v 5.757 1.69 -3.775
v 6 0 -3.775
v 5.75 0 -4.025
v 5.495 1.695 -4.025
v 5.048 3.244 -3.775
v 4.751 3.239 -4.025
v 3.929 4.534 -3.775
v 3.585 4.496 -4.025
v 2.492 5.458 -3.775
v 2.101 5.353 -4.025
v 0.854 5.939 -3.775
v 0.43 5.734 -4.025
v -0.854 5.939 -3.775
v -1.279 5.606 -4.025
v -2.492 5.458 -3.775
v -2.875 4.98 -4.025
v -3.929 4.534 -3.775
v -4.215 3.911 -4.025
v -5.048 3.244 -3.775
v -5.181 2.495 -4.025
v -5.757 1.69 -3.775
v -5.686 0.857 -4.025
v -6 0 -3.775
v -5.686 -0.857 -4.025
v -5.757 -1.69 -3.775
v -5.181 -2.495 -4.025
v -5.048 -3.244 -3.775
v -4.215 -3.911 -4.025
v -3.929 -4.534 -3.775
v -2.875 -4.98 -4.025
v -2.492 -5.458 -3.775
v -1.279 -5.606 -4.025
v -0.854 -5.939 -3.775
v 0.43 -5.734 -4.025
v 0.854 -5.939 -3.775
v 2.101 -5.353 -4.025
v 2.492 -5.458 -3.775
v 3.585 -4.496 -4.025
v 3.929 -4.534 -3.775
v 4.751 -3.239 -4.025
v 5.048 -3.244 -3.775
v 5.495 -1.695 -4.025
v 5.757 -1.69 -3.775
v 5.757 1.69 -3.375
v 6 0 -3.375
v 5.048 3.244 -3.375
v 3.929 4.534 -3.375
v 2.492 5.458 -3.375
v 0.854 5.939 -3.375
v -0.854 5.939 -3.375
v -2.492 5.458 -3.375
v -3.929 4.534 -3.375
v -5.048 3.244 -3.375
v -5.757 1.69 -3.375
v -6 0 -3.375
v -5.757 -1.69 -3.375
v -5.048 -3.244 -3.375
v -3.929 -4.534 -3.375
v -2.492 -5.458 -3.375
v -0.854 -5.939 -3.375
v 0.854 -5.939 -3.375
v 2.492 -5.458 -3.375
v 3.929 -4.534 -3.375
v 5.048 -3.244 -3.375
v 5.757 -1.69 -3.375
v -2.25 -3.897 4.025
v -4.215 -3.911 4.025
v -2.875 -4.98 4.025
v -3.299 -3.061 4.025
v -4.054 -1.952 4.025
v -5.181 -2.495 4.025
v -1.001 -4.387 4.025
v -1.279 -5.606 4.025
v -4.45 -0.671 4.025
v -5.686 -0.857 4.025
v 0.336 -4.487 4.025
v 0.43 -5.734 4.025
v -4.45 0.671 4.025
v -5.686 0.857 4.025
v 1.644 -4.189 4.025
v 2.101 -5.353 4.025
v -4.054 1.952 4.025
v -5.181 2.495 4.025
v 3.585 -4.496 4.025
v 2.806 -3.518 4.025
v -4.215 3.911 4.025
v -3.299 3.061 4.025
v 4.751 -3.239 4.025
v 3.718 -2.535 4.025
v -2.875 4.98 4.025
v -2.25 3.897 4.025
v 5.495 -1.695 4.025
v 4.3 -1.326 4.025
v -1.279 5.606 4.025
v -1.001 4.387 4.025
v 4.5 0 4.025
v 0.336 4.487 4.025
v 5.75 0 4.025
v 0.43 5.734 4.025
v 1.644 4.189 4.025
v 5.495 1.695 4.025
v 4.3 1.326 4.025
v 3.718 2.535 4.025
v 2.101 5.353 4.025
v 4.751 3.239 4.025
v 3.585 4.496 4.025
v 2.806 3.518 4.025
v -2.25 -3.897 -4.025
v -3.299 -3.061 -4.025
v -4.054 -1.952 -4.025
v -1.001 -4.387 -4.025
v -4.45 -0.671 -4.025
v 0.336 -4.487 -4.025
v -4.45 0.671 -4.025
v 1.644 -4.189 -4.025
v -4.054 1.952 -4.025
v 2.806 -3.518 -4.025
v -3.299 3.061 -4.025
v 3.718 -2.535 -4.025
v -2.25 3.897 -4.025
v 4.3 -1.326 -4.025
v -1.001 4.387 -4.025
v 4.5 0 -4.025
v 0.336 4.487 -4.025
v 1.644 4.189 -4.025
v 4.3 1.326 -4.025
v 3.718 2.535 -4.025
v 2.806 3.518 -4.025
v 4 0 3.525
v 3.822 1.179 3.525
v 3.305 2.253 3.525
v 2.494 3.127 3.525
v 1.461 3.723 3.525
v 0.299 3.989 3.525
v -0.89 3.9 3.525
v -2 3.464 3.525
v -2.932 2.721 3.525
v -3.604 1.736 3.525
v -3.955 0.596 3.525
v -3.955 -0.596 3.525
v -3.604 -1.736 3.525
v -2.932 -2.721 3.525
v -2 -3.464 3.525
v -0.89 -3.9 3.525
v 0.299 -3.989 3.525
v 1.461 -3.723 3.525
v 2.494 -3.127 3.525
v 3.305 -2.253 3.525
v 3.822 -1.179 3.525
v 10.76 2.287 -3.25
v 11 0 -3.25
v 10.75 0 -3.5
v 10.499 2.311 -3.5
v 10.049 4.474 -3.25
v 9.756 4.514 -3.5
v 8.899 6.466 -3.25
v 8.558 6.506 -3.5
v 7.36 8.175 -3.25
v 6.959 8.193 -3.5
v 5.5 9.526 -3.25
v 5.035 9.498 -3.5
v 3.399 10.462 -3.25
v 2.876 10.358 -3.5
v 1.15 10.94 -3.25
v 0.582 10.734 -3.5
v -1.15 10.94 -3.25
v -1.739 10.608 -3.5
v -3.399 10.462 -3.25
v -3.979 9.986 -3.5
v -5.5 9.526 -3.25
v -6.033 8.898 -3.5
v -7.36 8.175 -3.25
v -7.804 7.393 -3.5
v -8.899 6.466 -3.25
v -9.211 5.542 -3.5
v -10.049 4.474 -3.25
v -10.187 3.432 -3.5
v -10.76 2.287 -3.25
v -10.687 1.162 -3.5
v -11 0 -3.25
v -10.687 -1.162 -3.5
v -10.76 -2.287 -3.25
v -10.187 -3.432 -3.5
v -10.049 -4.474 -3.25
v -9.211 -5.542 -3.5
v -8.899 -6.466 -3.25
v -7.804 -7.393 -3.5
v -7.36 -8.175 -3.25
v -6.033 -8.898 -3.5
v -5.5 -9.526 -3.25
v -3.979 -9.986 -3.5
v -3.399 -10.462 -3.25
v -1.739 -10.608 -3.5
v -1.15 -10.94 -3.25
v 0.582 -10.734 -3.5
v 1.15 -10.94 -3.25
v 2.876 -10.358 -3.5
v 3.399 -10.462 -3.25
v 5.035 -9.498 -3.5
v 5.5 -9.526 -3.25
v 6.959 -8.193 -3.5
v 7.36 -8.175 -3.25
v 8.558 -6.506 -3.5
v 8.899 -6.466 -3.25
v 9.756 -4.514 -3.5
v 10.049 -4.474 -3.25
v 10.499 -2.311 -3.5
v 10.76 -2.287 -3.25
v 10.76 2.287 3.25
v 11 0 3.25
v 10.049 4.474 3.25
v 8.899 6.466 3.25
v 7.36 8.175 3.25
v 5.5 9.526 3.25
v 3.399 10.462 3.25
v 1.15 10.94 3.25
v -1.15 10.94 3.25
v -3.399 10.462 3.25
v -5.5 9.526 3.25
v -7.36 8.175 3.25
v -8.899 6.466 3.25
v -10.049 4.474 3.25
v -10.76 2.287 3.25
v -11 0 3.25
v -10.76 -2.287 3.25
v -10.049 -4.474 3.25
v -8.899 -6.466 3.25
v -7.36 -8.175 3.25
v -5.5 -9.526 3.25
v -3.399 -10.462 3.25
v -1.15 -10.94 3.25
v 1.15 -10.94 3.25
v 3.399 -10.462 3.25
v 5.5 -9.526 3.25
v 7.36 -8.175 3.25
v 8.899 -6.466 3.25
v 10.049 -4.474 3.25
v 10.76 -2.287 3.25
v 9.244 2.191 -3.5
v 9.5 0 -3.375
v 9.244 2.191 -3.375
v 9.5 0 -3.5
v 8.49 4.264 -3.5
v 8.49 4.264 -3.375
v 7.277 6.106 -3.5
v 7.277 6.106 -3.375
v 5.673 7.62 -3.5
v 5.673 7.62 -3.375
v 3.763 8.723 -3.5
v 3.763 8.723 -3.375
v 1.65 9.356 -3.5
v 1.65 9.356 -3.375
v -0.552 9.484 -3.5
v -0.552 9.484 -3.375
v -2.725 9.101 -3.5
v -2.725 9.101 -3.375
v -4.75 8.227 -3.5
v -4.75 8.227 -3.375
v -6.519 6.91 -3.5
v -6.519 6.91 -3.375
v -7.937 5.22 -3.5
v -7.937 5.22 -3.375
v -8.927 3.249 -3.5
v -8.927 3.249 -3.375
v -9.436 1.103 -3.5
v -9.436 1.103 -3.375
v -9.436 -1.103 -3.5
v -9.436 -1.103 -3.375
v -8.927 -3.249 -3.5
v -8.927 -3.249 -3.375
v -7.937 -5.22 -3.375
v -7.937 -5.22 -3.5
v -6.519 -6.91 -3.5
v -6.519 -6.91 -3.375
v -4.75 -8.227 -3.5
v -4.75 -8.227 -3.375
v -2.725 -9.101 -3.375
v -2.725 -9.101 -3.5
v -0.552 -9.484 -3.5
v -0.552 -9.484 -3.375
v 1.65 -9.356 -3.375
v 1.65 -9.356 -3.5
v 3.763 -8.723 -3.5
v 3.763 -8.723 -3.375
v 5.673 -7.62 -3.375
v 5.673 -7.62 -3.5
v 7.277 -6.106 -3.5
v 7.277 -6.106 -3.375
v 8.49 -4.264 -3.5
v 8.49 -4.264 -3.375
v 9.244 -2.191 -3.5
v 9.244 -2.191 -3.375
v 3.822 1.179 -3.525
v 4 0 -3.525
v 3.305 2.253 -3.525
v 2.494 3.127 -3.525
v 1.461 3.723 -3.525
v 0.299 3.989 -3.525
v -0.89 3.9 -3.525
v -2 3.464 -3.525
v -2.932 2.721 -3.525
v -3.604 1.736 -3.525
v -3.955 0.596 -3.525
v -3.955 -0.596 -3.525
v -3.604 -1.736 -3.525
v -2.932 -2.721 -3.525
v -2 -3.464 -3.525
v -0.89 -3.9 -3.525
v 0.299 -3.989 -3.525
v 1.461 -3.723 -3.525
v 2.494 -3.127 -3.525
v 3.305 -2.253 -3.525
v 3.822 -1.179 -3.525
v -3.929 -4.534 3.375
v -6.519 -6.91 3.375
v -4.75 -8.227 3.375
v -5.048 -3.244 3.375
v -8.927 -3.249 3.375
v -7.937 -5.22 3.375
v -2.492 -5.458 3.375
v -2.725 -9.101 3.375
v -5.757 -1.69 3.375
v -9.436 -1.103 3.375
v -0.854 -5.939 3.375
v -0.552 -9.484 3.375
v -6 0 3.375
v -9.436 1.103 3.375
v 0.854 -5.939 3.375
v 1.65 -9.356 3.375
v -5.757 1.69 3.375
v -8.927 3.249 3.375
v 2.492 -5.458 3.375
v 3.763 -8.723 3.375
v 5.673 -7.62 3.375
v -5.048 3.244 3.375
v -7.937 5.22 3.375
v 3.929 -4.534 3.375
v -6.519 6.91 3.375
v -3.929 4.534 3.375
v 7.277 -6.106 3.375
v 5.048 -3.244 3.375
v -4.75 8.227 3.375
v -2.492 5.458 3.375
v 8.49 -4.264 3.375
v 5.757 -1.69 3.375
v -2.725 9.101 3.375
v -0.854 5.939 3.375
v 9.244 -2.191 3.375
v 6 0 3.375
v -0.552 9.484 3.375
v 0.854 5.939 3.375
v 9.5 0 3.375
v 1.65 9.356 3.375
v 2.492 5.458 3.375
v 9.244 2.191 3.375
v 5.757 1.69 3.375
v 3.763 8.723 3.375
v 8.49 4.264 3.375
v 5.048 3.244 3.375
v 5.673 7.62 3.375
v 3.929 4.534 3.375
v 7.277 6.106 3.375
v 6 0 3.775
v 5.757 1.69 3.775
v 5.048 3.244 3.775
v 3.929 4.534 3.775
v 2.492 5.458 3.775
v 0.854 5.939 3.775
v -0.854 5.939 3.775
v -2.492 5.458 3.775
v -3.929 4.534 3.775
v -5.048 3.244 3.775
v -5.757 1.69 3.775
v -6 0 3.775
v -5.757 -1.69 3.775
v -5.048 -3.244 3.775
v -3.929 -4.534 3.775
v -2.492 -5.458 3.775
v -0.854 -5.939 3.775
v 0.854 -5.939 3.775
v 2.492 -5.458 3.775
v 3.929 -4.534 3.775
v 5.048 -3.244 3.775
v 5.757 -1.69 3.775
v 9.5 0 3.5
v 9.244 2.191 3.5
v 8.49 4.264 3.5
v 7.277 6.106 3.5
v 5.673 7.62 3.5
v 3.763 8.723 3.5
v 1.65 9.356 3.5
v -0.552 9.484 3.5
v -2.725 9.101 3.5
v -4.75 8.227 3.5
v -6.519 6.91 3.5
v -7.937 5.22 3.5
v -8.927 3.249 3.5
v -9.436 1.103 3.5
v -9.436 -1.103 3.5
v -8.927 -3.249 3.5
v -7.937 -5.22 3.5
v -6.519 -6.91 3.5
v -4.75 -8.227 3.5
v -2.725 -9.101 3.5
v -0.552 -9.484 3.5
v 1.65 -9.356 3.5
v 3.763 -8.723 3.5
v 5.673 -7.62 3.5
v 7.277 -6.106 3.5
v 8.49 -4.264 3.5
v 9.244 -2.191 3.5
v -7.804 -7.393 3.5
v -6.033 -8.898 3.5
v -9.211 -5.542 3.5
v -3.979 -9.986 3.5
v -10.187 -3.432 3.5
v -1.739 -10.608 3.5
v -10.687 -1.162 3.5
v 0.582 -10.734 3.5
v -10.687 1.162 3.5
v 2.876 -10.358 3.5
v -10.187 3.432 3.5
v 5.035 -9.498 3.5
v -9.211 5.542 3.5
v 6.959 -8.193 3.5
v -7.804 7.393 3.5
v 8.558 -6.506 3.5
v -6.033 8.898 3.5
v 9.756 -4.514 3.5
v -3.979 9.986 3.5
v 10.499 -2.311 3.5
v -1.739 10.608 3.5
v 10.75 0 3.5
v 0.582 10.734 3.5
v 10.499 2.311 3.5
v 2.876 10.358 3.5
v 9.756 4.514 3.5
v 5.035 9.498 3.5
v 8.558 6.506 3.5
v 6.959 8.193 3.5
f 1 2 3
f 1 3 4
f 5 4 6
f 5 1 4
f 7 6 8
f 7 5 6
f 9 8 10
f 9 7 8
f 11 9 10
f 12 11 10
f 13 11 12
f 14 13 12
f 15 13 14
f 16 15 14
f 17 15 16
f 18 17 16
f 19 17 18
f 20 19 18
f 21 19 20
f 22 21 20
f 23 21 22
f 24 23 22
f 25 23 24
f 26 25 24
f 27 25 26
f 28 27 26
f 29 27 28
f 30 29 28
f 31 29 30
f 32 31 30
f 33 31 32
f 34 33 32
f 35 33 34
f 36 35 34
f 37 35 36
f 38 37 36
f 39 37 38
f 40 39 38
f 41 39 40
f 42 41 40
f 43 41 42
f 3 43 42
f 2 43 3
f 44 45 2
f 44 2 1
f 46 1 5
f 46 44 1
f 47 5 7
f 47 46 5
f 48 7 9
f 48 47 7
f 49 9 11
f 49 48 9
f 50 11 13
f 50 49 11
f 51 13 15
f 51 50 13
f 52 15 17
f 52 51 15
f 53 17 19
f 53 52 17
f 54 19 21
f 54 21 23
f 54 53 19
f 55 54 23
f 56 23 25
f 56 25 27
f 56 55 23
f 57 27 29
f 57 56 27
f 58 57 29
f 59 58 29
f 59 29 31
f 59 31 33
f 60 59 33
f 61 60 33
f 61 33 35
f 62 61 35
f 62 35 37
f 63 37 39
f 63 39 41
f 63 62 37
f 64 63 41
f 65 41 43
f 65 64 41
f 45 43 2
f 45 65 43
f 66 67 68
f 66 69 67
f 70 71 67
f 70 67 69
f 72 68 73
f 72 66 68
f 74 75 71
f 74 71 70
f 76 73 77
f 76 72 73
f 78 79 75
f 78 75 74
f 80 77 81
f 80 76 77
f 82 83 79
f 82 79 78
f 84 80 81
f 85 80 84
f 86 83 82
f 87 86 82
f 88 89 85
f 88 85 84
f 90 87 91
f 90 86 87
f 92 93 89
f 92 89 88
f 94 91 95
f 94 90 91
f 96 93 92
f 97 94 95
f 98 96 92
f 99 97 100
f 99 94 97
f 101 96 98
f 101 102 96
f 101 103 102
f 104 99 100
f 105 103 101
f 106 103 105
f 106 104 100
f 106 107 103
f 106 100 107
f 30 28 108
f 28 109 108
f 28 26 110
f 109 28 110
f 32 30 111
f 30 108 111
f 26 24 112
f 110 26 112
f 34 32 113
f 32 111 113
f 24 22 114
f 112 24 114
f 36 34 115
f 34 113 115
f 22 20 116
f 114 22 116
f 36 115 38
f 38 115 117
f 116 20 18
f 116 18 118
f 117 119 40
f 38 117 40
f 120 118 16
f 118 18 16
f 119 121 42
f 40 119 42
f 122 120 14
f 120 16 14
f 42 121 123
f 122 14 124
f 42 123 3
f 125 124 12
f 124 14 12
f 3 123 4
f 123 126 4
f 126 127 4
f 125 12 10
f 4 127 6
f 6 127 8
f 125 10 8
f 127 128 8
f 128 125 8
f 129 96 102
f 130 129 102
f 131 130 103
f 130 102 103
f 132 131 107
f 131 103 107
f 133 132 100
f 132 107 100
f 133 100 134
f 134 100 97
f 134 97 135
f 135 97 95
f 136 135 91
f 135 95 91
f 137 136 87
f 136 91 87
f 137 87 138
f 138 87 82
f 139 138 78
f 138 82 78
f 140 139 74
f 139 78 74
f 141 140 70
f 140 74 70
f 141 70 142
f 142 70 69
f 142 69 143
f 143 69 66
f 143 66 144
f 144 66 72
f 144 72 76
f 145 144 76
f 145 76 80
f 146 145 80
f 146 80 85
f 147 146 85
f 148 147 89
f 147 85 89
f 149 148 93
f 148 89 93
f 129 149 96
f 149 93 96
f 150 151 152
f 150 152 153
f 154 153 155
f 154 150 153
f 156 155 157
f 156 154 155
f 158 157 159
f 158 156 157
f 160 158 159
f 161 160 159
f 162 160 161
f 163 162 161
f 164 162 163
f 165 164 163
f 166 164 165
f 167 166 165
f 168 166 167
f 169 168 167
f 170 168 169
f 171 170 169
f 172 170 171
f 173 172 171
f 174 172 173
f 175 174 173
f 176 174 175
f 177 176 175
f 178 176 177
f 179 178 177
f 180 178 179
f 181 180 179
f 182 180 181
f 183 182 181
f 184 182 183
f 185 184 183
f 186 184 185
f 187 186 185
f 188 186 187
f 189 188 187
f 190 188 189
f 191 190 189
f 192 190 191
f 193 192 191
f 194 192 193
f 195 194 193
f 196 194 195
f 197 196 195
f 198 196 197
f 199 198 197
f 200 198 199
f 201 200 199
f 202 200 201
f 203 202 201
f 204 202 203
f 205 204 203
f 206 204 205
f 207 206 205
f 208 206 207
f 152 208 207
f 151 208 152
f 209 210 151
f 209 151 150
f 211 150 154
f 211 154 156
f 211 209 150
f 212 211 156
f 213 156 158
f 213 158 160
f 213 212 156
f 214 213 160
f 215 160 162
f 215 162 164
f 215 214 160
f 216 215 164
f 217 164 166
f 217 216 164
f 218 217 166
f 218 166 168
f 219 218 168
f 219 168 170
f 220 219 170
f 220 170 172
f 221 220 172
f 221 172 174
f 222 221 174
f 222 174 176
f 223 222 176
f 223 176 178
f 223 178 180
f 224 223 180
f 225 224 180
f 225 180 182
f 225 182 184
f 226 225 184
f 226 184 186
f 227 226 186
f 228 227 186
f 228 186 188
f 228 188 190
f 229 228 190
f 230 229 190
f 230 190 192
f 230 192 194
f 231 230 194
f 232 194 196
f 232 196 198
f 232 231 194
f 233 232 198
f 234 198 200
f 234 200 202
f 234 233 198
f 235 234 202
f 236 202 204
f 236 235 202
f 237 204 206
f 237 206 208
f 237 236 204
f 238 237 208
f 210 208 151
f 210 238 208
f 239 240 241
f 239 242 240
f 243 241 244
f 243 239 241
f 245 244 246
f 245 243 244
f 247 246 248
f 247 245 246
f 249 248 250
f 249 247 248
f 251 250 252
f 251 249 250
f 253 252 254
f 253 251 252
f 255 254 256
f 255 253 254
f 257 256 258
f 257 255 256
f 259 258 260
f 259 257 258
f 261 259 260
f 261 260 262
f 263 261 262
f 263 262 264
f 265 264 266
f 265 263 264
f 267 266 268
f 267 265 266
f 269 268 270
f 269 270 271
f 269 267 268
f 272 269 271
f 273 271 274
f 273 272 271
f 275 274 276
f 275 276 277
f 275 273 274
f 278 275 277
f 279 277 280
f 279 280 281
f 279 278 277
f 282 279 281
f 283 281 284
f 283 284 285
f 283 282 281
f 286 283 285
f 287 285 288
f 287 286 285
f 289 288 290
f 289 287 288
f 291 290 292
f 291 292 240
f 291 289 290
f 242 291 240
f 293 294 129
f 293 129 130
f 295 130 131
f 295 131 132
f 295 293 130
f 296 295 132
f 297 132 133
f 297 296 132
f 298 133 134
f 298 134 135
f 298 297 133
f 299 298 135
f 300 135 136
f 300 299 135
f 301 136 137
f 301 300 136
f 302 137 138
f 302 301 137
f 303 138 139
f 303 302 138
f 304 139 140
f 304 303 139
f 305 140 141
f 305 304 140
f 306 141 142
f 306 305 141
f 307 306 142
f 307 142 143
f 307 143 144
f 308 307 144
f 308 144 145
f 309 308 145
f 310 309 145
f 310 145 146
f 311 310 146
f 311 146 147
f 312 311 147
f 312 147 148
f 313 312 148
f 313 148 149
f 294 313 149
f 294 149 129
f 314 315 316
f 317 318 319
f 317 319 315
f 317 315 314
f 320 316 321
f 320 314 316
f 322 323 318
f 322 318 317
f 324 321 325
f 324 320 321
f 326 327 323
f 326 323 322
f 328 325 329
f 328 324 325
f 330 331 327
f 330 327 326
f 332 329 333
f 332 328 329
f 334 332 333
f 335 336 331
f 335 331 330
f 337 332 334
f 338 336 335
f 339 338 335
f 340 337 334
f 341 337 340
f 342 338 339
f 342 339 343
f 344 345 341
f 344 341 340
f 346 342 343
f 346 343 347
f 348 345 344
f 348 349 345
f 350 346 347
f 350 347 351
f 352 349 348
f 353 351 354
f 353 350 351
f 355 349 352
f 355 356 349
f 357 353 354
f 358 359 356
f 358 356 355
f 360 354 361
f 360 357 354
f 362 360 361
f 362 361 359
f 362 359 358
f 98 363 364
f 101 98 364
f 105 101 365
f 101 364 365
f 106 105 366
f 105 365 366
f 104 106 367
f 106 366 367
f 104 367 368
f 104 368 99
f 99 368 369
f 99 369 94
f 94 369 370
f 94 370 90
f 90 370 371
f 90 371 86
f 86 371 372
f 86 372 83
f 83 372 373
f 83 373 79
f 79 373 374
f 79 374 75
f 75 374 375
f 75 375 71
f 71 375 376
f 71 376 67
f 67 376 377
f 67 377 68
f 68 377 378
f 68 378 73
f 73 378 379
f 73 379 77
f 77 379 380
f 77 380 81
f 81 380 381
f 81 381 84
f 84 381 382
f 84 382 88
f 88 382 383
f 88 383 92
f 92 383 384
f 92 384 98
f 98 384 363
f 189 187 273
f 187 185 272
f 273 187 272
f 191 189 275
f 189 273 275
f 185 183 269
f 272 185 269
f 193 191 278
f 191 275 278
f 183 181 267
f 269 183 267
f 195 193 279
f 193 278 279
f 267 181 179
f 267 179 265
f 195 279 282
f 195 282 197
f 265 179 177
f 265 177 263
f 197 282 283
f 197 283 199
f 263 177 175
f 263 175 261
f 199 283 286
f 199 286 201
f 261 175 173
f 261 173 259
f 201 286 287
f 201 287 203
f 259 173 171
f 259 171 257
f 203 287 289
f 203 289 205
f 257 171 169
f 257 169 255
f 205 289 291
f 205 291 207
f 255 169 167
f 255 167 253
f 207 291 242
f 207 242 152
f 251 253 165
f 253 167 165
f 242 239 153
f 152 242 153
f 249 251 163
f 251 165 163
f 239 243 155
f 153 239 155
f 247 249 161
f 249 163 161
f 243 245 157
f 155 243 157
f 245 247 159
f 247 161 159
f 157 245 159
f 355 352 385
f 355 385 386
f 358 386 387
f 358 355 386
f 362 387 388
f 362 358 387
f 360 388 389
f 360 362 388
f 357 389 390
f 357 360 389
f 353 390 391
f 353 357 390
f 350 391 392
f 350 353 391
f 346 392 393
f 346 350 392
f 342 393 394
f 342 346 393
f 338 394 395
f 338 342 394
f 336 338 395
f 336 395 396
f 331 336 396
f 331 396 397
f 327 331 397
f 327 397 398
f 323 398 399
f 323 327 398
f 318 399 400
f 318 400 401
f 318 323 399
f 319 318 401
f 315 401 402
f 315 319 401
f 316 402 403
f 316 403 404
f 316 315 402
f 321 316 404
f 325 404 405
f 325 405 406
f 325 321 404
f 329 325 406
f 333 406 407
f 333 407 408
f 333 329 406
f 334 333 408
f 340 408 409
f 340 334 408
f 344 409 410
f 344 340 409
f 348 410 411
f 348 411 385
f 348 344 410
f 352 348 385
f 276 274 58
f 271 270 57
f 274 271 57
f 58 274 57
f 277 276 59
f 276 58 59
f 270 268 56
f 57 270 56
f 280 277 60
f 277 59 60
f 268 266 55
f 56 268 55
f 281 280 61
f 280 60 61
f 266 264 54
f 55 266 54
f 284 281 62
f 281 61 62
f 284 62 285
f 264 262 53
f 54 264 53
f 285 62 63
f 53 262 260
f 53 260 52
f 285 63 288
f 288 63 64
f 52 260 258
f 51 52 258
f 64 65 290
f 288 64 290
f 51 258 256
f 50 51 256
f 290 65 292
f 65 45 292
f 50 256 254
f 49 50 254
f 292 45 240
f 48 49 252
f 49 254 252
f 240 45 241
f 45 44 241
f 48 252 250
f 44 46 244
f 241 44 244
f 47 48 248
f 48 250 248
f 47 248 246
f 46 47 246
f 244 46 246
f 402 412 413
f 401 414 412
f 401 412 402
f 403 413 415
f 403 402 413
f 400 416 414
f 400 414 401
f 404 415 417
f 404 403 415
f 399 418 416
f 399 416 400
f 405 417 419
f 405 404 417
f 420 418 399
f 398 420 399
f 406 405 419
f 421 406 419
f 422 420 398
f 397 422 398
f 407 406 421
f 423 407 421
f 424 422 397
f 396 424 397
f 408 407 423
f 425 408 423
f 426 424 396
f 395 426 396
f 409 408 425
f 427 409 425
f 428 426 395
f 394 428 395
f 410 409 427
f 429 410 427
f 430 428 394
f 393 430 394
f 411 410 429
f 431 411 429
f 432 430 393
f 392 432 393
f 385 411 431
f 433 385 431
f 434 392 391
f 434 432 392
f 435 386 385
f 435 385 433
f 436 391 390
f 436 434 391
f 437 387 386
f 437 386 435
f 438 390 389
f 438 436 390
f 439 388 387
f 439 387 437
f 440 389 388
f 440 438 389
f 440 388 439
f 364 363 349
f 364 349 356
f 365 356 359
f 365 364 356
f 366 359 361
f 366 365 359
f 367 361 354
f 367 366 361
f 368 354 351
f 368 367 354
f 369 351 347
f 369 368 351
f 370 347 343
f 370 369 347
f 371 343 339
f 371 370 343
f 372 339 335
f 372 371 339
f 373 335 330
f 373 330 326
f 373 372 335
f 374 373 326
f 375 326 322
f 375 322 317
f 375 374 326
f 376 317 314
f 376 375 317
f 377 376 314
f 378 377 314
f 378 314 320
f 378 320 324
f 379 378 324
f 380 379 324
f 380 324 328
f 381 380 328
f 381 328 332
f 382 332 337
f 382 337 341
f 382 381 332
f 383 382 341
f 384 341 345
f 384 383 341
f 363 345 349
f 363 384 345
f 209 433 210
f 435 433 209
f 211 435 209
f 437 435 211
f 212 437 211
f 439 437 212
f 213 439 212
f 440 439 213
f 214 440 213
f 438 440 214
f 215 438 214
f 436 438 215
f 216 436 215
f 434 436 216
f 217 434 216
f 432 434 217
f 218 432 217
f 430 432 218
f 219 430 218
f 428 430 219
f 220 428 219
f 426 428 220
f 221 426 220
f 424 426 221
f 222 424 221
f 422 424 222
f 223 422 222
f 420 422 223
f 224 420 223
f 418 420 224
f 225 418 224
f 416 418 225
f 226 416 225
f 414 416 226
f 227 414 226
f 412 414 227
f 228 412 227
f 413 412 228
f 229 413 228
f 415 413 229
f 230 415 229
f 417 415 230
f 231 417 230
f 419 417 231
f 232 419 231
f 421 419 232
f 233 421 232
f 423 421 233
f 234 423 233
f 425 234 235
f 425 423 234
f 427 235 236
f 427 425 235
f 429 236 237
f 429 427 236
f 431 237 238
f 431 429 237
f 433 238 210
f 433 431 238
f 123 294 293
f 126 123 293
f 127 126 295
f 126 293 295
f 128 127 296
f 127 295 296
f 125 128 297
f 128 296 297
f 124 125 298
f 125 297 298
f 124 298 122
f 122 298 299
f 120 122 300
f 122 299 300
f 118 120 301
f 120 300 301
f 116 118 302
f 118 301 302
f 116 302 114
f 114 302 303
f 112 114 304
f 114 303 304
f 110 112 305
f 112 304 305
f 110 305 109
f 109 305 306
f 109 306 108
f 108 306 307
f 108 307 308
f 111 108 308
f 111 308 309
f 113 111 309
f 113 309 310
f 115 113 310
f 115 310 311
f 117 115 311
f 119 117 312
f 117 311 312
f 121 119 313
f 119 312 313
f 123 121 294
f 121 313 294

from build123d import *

# Parameters (mm, degrees)
SKETCH1_R           = 11
SKETCH1_R_2         = 9.5
BOSS_EXTRUDE1_DEPTH = 3.5
SKETCH1_4_R         = 6
SKETCH1_4_R_2       = 4
BOSS_EXTRUDE2_DEPTH = 4.025
SKETCH1_5_R         = 9.5
SKETCH1_5_R_2       = 6
BOSS_EXTRUDE3_DEPTH = 3.375
CHAMFER1_SIZE       = 0.5
CHAMFER2_SIZE       = 0.25


with BuildPart() as part:
    # Sketch1 → Boss-Extrude1 (new body, symmetric)
    with BuildSketch(Plane.XY):
        Circle(SKETCH1_R)
        Circle(SKETCH1_R_2, mode=Mode.SUBTRACT)
    extrude(amount=BOSS_EXTRUDE1_DEPTH, both=True)



with BuildPart() as body_2:
    # Sketch1<4> → Boss-Extrude2 (new body, symmetric)
    with BuildSketch(Plane.XY):
        Circle(SKETCH1_4_R)
        Circle(SKETCH1_4_R_2, mode=Mode.SUBTRACT)
    extrude(amount=BOSS_EXTRUDE2_DEPTH, both=True)


with BuildPart() as part_1:
    add(part.part)

    add(body_2.part)  # Boss-Extrude3 merges body 2
    # Sketch1<5> → Boss-Extrude3 (add, symmetric)
    with BuildSketch(Plane.XY):
        Circle(SKETCH1_5_R)
        Circle(SKETCH1_5_R_2, mode=Mode.SUBTRACT)
    extrude(amount=BOSS_EXTRUDE3_DEPTH, both=True)

    # Chamfer1
    chamfer1_edges = [part_1.edges().sort_by_distance(p)[0] for p in [
        (-4, 0, 4.025),
        (-4, 0, -4.025),
    ]]
    chamfer(chamfer1_edges, length=CHAMFER1_SIZE)

    # Chamfer2
    chamfer2_edges = [part_1.edges().sort_by_distance(p)[0] for p in [
        (-11, 0, 3.5),
        (-6, 0, -4.025),
        (-6, 0, 4.025),
        (-11, 0, -3.5),
    ]]
    chamfer(chamfer2_edges, length=CHAMFER2_SIZE)


solid = part_1.part
